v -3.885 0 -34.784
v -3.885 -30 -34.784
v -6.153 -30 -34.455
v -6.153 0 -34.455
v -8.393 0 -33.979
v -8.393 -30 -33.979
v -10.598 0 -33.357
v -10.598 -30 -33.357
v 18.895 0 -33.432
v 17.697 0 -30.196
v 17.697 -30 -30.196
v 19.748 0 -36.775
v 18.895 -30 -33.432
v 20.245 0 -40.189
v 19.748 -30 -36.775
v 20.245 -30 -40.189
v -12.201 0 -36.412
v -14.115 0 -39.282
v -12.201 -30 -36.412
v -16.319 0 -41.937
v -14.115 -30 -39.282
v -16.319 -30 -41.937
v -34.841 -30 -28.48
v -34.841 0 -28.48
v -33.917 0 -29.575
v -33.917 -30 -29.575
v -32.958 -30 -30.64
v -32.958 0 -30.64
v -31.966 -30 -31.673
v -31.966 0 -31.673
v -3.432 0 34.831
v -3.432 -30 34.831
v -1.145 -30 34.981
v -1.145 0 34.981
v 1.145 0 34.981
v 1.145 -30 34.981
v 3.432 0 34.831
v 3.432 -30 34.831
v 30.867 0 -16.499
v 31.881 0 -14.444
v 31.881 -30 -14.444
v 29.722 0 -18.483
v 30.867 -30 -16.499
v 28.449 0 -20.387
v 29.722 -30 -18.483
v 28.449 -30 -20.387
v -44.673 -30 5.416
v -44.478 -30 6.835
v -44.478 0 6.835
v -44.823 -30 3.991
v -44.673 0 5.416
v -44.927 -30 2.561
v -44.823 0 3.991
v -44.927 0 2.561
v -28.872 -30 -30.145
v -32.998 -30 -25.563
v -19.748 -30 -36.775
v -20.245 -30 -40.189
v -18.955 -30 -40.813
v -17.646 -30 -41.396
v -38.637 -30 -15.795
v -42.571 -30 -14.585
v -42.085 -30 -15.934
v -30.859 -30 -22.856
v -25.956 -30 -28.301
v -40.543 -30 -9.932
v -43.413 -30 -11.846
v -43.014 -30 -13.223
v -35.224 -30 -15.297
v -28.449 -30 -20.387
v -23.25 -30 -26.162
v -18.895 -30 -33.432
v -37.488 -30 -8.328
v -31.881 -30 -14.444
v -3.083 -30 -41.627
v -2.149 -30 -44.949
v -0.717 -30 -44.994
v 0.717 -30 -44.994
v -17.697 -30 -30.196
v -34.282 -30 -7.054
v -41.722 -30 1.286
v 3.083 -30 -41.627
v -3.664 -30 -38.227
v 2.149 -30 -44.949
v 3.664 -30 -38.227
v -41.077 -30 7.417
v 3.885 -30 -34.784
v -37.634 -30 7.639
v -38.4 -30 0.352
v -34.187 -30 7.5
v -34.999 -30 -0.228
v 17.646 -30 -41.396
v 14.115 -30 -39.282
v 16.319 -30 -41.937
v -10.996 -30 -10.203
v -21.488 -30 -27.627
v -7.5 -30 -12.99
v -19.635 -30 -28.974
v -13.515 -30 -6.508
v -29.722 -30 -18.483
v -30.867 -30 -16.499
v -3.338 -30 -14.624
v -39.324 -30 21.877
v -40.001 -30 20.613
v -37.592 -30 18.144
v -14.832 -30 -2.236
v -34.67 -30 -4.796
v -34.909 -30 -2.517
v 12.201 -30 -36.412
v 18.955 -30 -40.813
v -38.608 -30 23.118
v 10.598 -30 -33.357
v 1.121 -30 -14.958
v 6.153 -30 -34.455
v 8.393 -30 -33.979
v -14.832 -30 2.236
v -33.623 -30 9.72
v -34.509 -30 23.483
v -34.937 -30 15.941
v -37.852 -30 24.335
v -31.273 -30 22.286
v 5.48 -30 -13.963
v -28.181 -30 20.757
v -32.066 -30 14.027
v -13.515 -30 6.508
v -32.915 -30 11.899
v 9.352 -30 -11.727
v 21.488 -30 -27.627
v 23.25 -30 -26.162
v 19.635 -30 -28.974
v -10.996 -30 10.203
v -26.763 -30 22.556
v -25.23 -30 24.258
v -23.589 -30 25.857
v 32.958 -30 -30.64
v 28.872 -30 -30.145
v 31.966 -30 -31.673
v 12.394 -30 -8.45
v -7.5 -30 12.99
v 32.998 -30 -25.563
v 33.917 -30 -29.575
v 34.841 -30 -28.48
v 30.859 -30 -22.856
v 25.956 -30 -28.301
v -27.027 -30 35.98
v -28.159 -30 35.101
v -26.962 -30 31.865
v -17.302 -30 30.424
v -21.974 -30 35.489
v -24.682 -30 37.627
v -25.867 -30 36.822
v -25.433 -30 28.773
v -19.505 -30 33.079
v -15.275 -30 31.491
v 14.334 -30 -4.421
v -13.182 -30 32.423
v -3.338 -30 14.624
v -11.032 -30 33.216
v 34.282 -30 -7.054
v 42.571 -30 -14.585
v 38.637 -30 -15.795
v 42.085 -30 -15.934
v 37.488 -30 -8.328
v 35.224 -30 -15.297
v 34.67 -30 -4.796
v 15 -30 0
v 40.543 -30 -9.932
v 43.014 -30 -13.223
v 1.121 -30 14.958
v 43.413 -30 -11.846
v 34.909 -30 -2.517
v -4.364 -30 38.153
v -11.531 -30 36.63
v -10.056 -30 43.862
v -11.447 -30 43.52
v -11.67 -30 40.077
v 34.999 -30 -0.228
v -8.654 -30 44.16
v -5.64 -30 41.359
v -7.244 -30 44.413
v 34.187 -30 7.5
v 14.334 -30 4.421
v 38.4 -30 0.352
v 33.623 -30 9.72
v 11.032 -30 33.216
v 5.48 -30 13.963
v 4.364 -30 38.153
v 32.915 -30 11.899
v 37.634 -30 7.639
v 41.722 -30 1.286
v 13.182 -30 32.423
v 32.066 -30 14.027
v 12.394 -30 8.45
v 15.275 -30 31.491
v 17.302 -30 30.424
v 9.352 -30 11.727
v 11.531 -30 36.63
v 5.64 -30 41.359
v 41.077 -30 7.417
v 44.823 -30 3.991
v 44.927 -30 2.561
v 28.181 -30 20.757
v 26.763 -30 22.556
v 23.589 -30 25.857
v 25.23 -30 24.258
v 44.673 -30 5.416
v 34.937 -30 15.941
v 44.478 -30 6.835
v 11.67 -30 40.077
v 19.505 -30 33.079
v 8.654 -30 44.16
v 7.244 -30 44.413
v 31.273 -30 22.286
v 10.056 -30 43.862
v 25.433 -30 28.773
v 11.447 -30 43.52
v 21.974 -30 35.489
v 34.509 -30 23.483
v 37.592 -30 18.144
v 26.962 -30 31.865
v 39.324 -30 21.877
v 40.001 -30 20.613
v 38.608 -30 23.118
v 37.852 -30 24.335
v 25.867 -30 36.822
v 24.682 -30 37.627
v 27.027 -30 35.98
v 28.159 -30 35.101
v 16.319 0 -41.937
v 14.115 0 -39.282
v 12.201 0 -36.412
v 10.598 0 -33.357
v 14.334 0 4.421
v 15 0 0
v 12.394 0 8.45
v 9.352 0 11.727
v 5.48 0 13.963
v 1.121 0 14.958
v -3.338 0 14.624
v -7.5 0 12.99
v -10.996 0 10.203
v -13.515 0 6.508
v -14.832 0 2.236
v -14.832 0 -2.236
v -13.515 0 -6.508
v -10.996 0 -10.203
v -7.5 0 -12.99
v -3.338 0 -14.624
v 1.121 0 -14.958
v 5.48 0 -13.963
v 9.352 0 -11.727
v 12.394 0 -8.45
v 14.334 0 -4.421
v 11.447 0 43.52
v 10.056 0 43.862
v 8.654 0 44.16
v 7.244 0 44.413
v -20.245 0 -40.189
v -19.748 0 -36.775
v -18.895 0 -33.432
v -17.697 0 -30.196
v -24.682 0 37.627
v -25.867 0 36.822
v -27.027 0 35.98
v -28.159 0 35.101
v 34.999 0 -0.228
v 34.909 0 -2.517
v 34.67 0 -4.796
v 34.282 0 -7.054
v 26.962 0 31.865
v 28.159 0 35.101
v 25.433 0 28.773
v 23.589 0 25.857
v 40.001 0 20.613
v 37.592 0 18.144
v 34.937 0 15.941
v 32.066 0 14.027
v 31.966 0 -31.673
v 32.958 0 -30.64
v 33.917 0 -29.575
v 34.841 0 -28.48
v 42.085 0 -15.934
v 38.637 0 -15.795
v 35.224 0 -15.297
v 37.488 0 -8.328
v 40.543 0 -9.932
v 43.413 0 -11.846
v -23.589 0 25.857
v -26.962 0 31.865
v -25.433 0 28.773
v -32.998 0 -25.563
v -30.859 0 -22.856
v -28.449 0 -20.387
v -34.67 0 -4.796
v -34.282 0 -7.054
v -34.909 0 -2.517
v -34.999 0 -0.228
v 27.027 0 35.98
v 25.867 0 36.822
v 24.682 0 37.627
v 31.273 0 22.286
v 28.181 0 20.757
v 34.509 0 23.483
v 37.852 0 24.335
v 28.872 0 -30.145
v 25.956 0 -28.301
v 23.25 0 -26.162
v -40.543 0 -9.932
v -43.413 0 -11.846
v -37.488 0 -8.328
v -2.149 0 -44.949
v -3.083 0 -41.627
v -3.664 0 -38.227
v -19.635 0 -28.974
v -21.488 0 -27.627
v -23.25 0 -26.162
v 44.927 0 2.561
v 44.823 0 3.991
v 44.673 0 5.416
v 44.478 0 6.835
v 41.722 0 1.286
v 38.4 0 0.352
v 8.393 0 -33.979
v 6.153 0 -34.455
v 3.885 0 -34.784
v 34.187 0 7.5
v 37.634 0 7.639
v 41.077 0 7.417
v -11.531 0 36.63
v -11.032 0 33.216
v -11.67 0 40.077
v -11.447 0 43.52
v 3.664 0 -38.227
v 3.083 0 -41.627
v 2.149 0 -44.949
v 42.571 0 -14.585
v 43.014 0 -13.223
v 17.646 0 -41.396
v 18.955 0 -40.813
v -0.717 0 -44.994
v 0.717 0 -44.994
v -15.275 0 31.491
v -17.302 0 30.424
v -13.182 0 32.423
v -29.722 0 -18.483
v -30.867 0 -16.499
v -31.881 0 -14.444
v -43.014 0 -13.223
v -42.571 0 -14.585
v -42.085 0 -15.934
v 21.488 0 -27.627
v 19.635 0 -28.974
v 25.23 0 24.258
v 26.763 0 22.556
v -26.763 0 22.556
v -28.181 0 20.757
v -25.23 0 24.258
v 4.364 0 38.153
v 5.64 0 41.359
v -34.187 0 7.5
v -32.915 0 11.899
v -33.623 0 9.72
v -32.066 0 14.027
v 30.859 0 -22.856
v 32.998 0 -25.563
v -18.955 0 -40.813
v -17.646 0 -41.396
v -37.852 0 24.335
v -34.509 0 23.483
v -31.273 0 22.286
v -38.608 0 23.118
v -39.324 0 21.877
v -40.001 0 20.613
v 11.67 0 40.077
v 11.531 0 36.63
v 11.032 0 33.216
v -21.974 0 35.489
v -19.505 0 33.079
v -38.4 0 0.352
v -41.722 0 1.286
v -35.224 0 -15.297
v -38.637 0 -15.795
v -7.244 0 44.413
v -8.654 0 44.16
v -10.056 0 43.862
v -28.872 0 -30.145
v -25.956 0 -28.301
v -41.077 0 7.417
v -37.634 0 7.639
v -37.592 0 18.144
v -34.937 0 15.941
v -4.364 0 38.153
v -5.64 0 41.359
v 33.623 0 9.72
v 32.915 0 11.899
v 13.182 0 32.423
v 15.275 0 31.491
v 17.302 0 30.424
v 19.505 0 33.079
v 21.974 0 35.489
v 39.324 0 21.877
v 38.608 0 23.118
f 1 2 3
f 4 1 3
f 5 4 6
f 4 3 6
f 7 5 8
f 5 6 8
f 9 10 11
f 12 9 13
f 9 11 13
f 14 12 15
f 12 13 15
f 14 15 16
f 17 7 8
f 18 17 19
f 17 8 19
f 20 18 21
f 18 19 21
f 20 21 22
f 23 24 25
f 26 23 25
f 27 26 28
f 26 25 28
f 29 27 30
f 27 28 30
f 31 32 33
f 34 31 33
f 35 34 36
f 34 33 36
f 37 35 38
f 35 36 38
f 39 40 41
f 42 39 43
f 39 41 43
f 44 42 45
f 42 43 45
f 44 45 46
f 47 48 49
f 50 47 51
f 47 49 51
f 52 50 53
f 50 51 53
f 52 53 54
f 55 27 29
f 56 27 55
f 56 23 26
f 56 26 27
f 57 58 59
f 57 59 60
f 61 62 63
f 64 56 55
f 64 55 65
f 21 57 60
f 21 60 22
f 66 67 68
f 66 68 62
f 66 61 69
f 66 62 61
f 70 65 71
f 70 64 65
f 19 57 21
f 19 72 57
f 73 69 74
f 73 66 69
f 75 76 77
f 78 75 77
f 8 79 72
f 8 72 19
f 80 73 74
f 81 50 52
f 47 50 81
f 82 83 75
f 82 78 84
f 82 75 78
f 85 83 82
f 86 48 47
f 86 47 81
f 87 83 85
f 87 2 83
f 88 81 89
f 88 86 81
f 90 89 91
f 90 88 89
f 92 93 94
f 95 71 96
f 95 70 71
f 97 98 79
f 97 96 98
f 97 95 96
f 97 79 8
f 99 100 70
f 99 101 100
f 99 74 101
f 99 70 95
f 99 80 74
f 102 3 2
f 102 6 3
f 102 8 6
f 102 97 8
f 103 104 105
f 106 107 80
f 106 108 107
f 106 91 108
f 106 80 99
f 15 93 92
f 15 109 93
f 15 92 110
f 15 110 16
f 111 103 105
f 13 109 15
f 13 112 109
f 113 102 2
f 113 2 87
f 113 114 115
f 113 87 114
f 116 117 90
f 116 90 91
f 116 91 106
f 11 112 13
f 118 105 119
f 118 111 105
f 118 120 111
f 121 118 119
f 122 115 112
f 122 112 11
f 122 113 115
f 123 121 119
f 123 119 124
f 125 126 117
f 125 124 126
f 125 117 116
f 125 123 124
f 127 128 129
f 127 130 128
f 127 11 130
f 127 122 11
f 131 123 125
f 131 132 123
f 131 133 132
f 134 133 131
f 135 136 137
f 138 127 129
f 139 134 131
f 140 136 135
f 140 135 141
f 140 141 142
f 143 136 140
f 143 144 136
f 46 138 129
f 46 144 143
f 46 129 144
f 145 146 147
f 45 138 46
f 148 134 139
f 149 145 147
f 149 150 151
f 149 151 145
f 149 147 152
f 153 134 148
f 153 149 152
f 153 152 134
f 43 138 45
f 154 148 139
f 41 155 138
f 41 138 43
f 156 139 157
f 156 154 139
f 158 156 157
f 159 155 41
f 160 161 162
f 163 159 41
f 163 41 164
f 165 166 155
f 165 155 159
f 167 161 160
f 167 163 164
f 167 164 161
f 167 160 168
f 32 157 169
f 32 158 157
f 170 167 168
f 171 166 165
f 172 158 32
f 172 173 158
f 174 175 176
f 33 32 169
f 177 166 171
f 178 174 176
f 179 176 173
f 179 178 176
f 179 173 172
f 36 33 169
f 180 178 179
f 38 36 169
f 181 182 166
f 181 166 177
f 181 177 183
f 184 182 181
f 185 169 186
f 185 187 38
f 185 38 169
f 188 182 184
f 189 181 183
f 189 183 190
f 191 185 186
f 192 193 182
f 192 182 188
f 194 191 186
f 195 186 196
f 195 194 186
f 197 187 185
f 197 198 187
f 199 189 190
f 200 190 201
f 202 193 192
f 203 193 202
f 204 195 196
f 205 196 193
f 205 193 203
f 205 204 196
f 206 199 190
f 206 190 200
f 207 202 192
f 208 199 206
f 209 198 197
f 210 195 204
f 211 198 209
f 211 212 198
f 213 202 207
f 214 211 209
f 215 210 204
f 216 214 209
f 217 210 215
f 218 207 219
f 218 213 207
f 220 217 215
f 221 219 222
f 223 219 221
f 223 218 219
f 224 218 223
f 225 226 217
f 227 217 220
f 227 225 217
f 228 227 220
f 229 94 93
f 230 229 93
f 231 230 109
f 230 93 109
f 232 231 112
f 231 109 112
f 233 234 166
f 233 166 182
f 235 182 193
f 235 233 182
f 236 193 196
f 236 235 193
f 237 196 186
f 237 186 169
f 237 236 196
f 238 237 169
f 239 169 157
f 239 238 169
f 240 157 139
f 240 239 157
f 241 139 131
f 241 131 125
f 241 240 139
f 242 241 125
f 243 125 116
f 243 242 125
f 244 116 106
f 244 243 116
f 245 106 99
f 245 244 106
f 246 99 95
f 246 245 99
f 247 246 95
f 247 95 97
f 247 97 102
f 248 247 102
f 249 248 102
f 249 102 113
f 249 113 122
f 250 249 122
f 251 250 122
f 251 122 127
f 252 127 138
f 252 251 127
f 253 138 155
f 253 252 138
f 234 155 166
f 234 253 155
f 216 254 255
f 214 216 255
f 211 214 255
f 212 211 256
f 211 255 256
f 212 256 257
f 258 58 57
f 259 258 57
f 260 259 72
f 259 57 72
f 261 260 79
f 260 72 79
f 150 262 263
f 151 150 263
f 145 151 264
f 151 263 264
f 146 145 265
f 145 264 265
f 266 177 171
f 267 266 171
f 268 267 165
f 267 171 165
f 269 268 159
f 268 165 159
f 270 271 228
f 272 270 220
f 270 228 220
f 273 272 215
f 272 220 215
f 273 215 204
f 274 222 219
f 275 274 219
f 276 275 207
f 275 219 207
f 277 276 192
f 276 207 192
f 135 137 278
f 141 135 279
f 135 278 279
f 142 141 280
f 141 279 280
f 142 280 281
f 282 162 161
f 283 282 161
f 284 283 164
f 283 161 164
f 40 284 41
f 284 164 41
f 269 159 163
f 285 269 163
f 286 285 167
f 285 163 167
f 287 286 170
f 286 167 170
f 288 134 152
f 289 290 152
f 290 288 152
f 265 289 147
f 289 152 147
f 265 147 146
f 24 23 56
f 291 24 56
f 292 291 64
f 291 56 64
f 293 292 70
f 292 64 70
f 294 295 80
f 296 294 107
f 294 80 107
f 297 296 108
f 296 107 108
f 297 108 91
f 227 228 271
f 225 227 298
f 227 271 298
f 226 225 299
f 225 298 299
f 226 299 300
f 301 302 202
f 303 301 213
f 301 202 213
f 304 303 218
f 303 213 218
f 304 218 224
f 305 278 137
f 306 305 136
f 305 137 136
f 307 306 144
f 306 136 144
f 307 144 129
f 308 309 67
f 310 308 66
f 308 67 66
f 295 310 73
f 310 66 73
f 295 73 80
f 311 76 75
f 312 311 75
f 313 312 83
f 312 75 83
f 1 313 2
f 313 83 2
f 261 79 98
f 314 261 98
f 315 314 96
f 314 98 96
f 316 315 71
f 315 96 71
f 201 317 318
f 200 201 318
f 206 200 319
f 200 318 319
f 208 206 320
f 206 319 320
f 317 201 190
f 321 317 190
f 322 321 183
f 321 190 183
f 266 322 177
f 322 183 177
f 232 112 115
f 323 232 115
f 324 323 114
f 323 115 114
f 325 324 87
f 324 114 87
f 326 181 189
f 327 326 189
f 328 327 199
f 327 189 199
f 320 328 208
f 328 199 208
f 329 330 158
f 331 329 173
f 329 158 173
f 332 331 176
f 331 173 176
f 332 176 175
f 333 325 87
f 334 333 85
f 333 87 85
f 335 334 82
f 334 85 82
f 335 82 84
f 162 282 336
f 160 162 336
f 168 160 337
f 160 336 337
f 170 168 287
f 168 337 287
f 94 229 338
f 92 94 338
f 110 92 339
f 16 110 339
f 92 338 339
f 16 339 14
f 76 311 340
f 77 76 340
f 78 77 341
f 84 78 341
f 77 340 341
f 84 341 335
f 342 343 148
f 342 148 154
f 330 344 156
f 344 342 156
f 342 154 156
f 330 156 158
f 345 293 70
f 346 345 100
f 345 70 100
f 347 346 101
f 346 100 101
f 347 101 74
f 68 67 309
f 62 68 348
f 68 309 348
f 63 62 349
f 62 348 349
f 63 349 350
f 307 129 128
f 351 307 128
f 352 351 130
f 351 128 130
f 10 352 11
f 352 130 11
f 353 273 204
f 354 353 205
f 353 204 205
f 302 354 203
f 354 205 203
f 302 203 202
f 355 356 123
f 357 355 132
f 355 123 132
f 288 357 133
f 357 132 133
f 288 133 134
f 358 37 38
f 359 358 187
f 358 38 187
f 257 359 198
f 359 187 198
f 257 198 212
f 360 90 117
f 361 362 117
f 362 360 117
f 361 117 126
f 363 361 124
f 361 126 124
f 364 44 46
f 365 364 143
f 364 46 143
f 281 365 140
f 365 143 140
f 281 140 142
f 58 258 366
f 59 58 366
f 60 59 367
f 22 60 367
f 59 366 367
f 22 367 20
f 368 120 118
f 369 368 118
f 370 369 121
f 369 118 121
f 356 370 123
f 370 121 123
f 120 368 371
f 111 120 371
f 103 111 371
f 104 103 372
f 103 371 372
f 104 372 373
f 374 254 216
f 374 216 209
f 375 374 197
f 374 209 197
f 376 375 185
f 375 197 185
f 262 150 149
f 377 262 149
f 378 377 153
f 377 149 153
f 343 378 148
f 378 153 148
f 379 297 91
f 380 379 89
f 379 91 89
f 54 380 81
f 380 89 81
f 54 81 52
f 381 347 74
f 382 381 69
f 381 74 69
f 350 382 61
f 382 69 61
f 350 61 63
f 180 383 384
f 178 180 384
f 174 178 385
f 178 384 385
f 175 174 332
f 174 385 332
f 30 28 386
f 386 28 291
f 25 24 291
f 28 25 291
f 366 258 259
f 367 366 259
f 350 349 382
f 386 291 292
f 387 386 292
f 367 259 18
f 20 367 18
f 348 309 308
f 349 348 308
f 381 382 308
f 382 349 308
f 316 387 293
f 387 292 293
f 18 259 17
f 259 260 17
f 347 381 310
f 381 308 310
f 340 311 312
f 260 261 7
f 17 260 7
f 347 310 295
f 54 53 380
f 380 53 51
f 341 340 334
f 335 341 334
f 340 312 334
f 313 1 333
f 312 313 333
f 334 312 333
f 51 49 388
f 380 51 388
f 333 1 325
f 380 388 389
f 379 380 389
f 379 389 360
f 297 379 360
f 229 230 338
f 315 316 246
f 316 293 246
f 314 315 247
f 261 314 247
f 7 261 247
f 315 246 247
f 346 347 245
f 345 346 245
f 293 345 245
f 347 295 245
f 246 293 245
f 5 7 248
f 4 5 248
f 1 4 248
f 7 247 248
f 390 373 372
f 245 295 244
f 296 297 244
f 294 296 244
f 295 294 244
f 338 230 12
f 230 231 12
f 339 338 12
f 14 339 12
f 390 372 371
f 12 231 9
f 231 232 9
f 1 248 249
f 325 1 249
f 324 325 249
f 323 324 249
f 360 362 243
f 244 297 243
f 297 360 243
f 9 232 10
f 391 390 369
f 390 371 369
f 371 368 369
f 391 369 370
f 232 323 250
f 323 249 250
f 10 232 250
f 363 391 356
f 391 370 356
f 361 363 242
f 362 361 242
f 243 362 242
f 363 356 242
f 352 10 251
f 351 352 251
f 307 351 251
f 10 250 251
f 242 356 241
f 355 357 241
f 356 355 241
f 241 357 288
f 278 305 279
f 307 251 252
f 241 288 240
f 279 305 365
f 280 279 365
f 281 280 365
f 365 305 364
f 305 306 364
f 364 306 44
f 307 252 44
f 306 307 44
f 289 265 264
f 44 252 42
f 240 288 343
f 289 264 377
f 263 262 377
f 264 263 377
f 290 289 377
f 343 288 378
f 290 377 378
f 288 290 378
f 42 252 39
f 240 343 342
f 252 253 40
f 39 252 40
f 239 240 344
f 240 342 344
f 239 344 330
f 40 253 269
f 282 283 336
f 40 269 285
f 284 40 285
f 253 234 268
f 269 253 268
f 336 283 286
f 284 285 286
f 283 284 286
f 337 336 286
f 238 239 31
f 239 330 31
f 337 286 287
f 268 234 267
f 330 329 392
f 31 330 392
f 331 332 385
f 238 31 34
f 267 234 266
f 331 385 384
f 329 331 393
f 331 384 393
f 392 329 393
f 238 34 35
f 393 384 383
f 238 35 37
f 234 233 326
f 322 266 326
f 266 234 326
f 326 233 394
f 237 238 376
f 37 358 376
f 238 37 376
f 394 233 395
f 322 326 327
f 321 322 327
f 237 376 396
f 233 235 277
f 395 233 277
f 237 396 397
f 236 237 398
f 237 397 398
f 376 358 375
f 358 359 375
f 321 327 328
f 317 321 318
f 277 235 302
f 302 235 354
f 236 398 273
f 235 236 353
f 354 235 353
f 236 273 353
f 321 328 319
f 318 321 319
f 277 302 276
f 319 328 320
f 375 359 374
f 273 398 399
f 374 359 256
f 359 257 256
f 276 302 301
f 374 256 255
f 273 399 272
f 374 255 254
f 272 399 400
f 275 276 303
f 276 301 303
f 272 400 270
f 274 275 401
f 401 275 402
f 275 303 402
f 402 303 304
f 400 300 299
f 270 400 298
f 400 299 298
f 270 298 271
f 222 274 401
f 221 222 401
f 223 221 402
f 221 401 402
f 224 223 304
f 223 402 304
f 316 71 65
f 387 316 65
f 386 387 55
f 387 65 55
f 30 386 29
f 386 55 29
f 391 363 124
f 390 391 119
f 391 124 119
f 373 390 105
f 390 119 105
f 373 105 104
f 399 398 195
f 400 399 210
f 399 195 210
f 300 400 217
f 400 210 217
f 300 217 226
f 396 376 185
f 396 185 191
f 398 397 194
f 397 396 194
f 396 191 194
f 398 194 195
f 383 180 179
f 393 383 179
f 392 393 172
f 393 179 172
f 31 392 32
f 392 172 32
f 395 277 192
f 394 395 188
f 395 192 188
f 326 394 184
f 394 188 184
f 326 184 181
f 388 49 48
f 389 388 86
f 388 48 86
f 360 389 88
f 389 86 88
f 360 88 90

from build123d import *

# Parameters (mm, degrees)
F0_R     = 45
F0_R_2   = 15
F1_DEPTH = 30
F3_DEPTH = 31


with BuildPart() as f1:
    # F0 (on Front) → F1 (new body)
    with BuildSketch(Plane.XZ):
        Circle(F0_R)
        Circle(F0_R_2, mode=Mode.SUBTRACT)
    extrude(amount=F1_DEPTH)

    # F2 (on face) → F3 (cut)
    with BuildSketch(Plane.XZ.offset(30)):
        with BuildLine():
            ThreePointArc((10.376717, 48.818613), (10.409932, 48.857949), (10.443208, 48.897233))
            ThreePointArc((10.443208, 48.897233), (10.395585, 48.90738), (10.347951, 48.917481))
            ThreePointArc((10.347951, 48.917481), (10.362373, 48.868058), (10.376717, 48.818613))
        make_face()
        with BuildLine():
            ThreePointArc((29.349856, 40.479451), (20.336832, 45.677273), (10.443208, 48.897233))
            ThreePointArc((10.443208, 48.897233), (10.409932, 48.857949), (10.376717, 48.818613))
            ThreePointArc((10.376717, 48.818613), (11.643532, 41.056647), (11.032353, 33.215767))
            ThreePointArc((11.032353, 33.215767), (14.235783, 31.974091), (17.30204, 30.424323))
            ThreePointArc((17.30204, 30.424323), (22.719991, 36.12509), (29.335921, 40.377432))
            ThreePointArc((29.335921, 40.377432), (29.342928, 40.428436), (29.349856, 40.479451))
        make_face()
        with BuildLine():
            ThreePointArc((10.376717, 48.818613), (10.362373, 48.868058), (10.347951, 48.917481))
            ThreePointArc((10.347951, 48.917481), (0, 50), (-10.347951, 48.917481))
            ThreePointArc((-10.347951, 48.917481), (-10.362373, 48.868058), (-10.376717, 48.818613))
            ThreePointArc((-10.376717, 48.818613), (-6.062347, 42.242965), (-3.431513, 34.831375))
            ThreePointArc((-3.431513, 34.831375), (0, 35), (3.431513, 34.831375))
            ThreePointArc((3.431513, 34.831375), (6.062347, 42.242965), (10.376717, 48.818613))
        make_face()
        with BuildLine():
            ThreePointArc((29.428642, 40.42221), (29.389263, 40.45085), (29.349856, 40.479451))
            ThreePointArc((29.349856, 40.479451), (29.342928, 40.428436), (29.335921, 40.377432))
            ThreePointArc((29.335921, 40.377432), (29.382264, 40.399857), (29.428642, 40.42221))
        make_face()
        with BuildLine():
            ThreePointArc((-10.376717, 48.818613), (-10.362373, 48.868058), (-10.347951, 48.917481))
            ThreePointArc((-10.347951, 48.917481), (-10.395585, 48.90738), (-10.443208, 48.897233))
            ThreePointArc((-10.443208, 48.897233), (-10.409932, 48.857949), (-10.376717, 48.818613))
        make_face()
        with BuildLine():
            ThreePointArc((43.276903, 25.042157), (37.157241, 33.45653), (29.428642, 40.42221))
            ThreePointArc((29.428642, 40.42221), (29.382264, 40.399857), (29.335921, 40.377432))
            ThreePointArc((29.335921, 40.377432), (27.336139, 32.771262), (23.588626, 25.856851))
            ThreePointArc((23.588626, 25.856851), (26.010069, 23.419571), (28.180887, 20.756628))
            ThreePointArc((28.180887, 20.756628), (35.449143, 23.760859), (43.222679, 24.954625))
            ThreePointArc((43.222679, 24.954625), (43.249825, 24.99837), (43.276903, 25.042157))
        make_face()
        with BuildLine():
            ThreePointArc((-10.376717, 48.818613), (-10.409932, 48.857949), (-10.443208, 48.897233))
            ThreePointArc((-10.443208, 48.897233), (-20.336832, 45.677273), (-29.349856, 40.479451))
            ThreePointArc((-29.349856, 40.479451), (-29.342928, 40.428436), (-29.335921, 40.377432))
            ThreePointArc((-29.335921, 40.377432), (-22.719991, 36.12509), (-17.30204, 30.424323))
            ThreePointArc((-17.30204, 30.424323), (-14.235783, 31.974091), (-11.032353, 33.215767))
            ThreePointArc((-11.032353, 33.215767), (-11.643532, 41.056647), (-10.376717, 48.818613))
        make_face()
        with BuildLine():
            ThreePointArc((43.325596, 24.957819), (43.30127, 25), (43.276903, 25.042157))
            ThreePointArc((43.276903, 25.042157), (43.249825, 24.99837), (43.222679, 24.954625))
            ThreePointArc((43.222679, 24.954625), (43.274136, 24.956262), (43.325596, 24.957819))
        make_face()
        with BuildLine():
            ThreePointArc((-29.335921, 40.377432), (-29.342928, 40.428436), (-29.349856, 40.479451))
            ThreePointArc((-29.349856, 40.479451), (-29.389263, 40.45085), (-29.428642, 40.42221))
            ThreePointArc((-29.428642, 40.42221), (-29.382264, 40.399857), (-29.335921, 40.377432))
        make_face()
        with BuildLine():
            ThreePointArc((49.720981, 5.274846), (47.552826, 15.45085), (43.325596, 24.957819))
            ThreePointArc((43.325596, 24.957819), (43.274136, 24.956262), (43.222679, 24.954625))
            ThreePointArc((43.222679, 24.954625), (38.302079, 18.819429), (32.066211, 14.02705))
            ThreePointArc((32.066211, 14.02705), (33.286978, 10.815595), (34.187003, 7.499924))
            ThreePointArc((34.187003, 7.499924), (42.048815, 7.288159), (49.635842, 5.216937))
            ThreePointArc((49.635842, 5.216937), (49.678434, 5.245858), (49.720981, 5.274846))
        make_face()
        with BuildLine():
            ThreePointArc((-29.335921, 40.377432), (-29.382264, 40.399857), (-29.428642, 40.42221))
            ThreePointArc((-29.428642, 40.42221), (-37.157241, 33.45653), (-43.276903, 25.042157))
            ThreePointArc((-43.276903, 25.042157), (-43.249825, 24.99837), (-43.222679, 24.954625))
            ThreePointArc((-43.222679, 24.954625), (-35.449143, 23.760859), (-28.180887, 20.756628))
            ThreePointArc((-28.180887, 20.756628), (-26.010069, 23.419571), (-23.588626, 25.856851))
            ThreePointArc((-23.588626, 25.856851), (-27.336139, 32.771262), (-29.335921, 40.377432))
        make_face()
        with BuildLine():
            ThreePointArc((49.731161, 5.177995), (49.726095, 5.226423), (49.720981, 5.274846))
            ThreePointArc((49.720981, 5.274846), (49.678434, 5.245858), (49.635842, 5.216937))
            ThreePointArc((49.635842, 5.216937), (49.683517, 5.197503), (49.731161, 5.177995))
        make_face()
        with BuildLine():
            ThreePointArc((-43.222679, 24.954625), (-43.249825, 24.99837), (-43.276903, 25.042157))
            ThreePointArc((-43.276903, 25.042157), (-43.30127, 25), (-43.325596, 24.957819))
            ThreePointArc((-43.325596, 24.957819), (-43.274136, 24.956262), (-43.222679, 24.954625))
        make_face()
        with BuildLine():
            ThreePointArc((47.56785, -15.404533), (49.726095, -5.226423), (49.731161, 5.177995))
            ThreePointArc((49.731161, 5.177995), (49.683517, 5.197503), (49.635842, 5.216937))
            ThreePointArc((49.635842, 5.216937), (42.645241, 1.613545), (34.999256, -0.228155))
            ThreePointArc((34.999256, -0.228155), (34.808266, -3.658496), (34.281875, -7.053585))
            ThreePointArc((34.281875, -7.053585), (41.377866, -10.444729), (47.466518, -15.422806))
            ThreePointArc((47.466518, -15.422806), (47.517191, -15.413709), (47.56785, -15.404533))
        make_face()
        with BuildLine():
            ThreePointArc((-43.222679, 24.954625), (-43.274136, 24.956262), (-43.325596, 24.957819))
            ThreePointArc((-43.325596, 24.957819), (-47.552826, 15.45085), (-49.720981, 5.274846))
            ThreePointArc((-49.720981, 5.274846), (-49.678434, 5.245858), (-49.635842, 5.216937))
            ThreePointArc((-49.635842, 5.216937), (-42.048815, 7.288159), (-34.187003, 7.499924))
            ThreePointArc((-34.187003, 7.499924), (-33.286978, 10.815595), (-32.066211, 14.02705))
            ThreePointArc((-32.066211, 14.02705), (-38.302079, 18.819429), (-43.222679, 24.954625))
        make_face()
        with BuildLine():
            ThreePointArc((47.537757, -15.497152), (47.552826, -15.45085), (47.56785, -15.404533))
            ThreePointArc((47.56785, -15.404533), (47.517191, -15.413709), (47.466518, -15.422806))
            ThreePointArc((47.466518, -15.422806), (47.502166, -15.459951), (47.537757, -15.497152))
        make_face()
        with BuildLine():
            ThreePointArc((-49.635842, 5.216937), (-49.678434, 5.245858), (-49.720981, 5.274846))
            ThreePointArc((-49.720981, 5.274846), (-49.726095, 5.226423), (-49.731161, 5.177995))
            ThreePointArc((-49.731161, 5.177995), (-49.683517, 5.197503), (-49.635842, 5.216937))
        make_face()
        with BuildLine():
            ThreePointArc((37.189805, -33.420329), (43.30127, -25), (47.537757, -15.497152))
            ThreePointArc((47.537757, -15.497152), (47.502166, -15.459951), (47.466518, -15.422806))
            ThreePointArc((47.466518, -15.422806), (39.614654, -15.871336), (31.880613, -14.44391))
            ThreePointArc((31.880613, -14.44391), (30.310889, -17.5), (28.449099, -20.387466))
            ThreePointArc((28.449099, -20.387466), (33.552307, -26.371629), (37.089801, -33.395807))
            ThreePointArc((37.089801, -33.395807), (37.139794, -33.408107), (37.189805, -33.420329))
        make_face()
        with BuildLine():
            ThreePointArc((-49.635842, 5.216937), (-49.683517, 5.197503), (-49.731161, 5.177995))
            ThreePointArc((-49.731161, 5.177995), (-49.726095, -5.226423), (-47.56785, -15.404533))
            ThreePointArc((-47.56785, -15.404533), (-47.517191, -15.413709), (-47.466518, -15.422806))
            ThreePointArc((-47.466518, -15.422806), (-41.377866, -10.444729), (-34.281875, -7.053585))
            ThreePointArc((-34.281875, -7.053585), (-34.808266, -3.658496), (-34.999256, -0.228155))
            ThreePointArc((-34.999256, -0.228155), (-42.645241, 1.613545), (-49.635842, 5.216937))
        make_face()
        with BuildLine():
            ThreePointArc((37.124642, -33.4927), (37.157241, -33.45653), (37.189805, -33.420329))
            ThreePointArc((37.189805, -33.420329), (37.139794, -33.408107), (37.089801, -33.395807))
            ThreePointArc((37.089801, -33.395807), (37.107259, -33.44424), (37.124642, -33.4927))
        make_face()
        with BuildLine():
            ThreePointArc((-47.466518, -15.422806), (-47.517191, -15.413709), (-47.56785, -15.404533))
            ThreePointArc((-47.56785, -15.404533), (-47.552826, -15.45085), (-47.537757, -15.497152))
            ThreePointArc((-47.537757, -15.497152), (-47.502166, -15.459951), (-47.466518, -15.422806))
        make_face()
        with BuildLine():
            ThreePointArc((20.381305, -45.657446), (29.389263, -40.45085), (37.124642, -33.4927))
            ThreePointArc((37.124642, -33.4927), (37.107259, -33.44424), (37.089801, -33.395807))
            ThreePointArc((37.089801, -33.395807), (29.734333, -30.611918), (23.249521, -26.162182))
            ThreePointArc((23.249521, -26.162182), (20.572484, -28.315595), (17.697216, -30.196168))
            ThreePointArc((17.697216, -30.196168), (19.92525, -37.738634), (20.299921, -45.594369))
            ThreePointArc((20.299921, -45.594369), (20.340588, -45.625939), (20.381305, -45.657446))
        make_face()
        with BuildLine():
            ThreePointArc((-47.466518, -15.422806), (-47.502166, -15.459951), (-47.537757, -15.497152))
            ThreePointArc((-47.537757, -15.497152), (-43.30127, -25), (-37.189805, -33.420329))
            ThreePointArc((-37.189805, -33.420329), (-37.139794, -33.408107), (-37.089801, -33.395807))
            ThreePointArc((-37.089801, -33.395807), (-33.552307, -26.371629), (-28.449099, -20.387466))
            ThreePointArc((-28.449099, -20.387466), (-30.310889, -17.5), (-31.880613, -14.44391))
            ThreePointArc((-31.880613, -14.44391), (-39.614654, -15.871336), (-47.466518, -15.422806))
        make_face()
        with BuildLine():
            ThreePointArc((20.29234, -45.697056), (20.336832, -45.677273), (20.381305, -45.657446))
            ThreePointArc((20.381305, -45.657446), (20.340588, -45.625939), (20.299921, -45.594369))
            ThreePointArc((20.299921, -45.594369), (20.296171, -45.645715), (20.29234, -45.697056))
        make_face()
        with BuildLine():
            ThreePointArc((-37.089801, -33.395807), (-37.139794, -33.408107), (-37.189805, -33.420329))
            ThreePointArc((-37.189805, -33.420329), (-37.157241, -33.45653), (-37.124642, -33.4927))
            ThreePointArc((-37.124642, -33.4927), (-37.107259, -33.44424), (-37.089801, -33.395807))
        make_face()
        with BuildLine():
            ThreePointArc((0.048692, -49.999976), (10.395585, -48.90738), (20.29234, -45.697056))
            ThreePointArc((20.29234, -45.697056), (20.296171, -45.645715), (20.299921, -45.594369))
            ThreePointArc((20.299921, -45.594369), (14.712676, -40.059422), (10.598377, -33.356775))
            ThreePointArc((10.598377, -33.356775), (7.276909, -34.235166), (3.885324, -34.783678))
            ThreePointArc((3.885324, -34.783678), (2.852936, -42.580287), (0, -49.90925))
            ThreePointArc((0, -49.90925), (0.024311, -49.954632), (0.048692, -49.999976))
        make_face()
        with BuildLine():
            ThreePointArc((-37.089801, -33.395807), (-37.107259, -33.44424), (-37.124642, -33.4927))
            ThreePointArc((-37.124642, -33.4927), (-29.389263, -40.45085), (-20.381305, -45.657446))
            ThreePointArc((-20.381305, -45.657446), (-20.340588, -45.625939), (-20.299921, -45.594369))
            ThreePointArc((-20.299921, -45.594369), (-19.92525, -37.738634), (-17.697216, -30.196168))
            ThreePointArc((-17.697216, -30.196168), (-20.572484, -28.315595), (-23.249521, -26.162182))
            ThreePointArc((-23.249521, -26.162182), (-29.734333, -30.611918), (-37.089801, -33.395807))
        make_face()
        with BuildLine():
            ThreePointArc((-0.048692, -49.999976), (0, -50), (0.048692, -49.999976))
            ThreePointArc((0.048692, -49.999976), (0.024311, -49.954632), (0, -49.90925))
            ThreePointArc((0, -49.90925), (-0.024311, -49.954632), (-0.048692, -49.999976))
        make_face()
        with BuildLine():
            ThreePointArc((-20.299921, -45.594369), (-20.340588, -45.625939), (-20.381305, -45.657446))
            ThreePointArc((-20.381305, -45.657446), (-20.336832, -45.677273), (-20.29234, -45.697056))
            ThreePointArc((-20.29234, -45.697056), (-20.296171, -45.645715), (-20.299921, -45.594369))
        make_face()
        with BuildLine():
            ThreePointArc((-20.29234, -45.697056), (-10.395585, -48.90738), (-0.048692, -49.999976))
            ThreePointArc((-0.048692, -49.999976), (-0.024311, -49.954632), (0, -49.90925))
            ThreePointArc((0, -49.90925), (-2.852936, -42.580287), (-3.885324, -34.783678))
            ThreePointArc((-3.885324, -34.783678), (-7.276909, -34.235166), (-10.598377, -33.356775))
            ThreePointArc((-10.598377, -33.356775), (-14.712676, -40.059422), (-20.299921, -45.594369))
            ThreePointArc((-20.299921, -45.594369), (-20.296171, -45.645715), (-20.29234, -45.697056))
        make_face()
    extrude(amount=-F3_DEPTH, mode=Mode.SUBTRACT)


solid = f1.part
